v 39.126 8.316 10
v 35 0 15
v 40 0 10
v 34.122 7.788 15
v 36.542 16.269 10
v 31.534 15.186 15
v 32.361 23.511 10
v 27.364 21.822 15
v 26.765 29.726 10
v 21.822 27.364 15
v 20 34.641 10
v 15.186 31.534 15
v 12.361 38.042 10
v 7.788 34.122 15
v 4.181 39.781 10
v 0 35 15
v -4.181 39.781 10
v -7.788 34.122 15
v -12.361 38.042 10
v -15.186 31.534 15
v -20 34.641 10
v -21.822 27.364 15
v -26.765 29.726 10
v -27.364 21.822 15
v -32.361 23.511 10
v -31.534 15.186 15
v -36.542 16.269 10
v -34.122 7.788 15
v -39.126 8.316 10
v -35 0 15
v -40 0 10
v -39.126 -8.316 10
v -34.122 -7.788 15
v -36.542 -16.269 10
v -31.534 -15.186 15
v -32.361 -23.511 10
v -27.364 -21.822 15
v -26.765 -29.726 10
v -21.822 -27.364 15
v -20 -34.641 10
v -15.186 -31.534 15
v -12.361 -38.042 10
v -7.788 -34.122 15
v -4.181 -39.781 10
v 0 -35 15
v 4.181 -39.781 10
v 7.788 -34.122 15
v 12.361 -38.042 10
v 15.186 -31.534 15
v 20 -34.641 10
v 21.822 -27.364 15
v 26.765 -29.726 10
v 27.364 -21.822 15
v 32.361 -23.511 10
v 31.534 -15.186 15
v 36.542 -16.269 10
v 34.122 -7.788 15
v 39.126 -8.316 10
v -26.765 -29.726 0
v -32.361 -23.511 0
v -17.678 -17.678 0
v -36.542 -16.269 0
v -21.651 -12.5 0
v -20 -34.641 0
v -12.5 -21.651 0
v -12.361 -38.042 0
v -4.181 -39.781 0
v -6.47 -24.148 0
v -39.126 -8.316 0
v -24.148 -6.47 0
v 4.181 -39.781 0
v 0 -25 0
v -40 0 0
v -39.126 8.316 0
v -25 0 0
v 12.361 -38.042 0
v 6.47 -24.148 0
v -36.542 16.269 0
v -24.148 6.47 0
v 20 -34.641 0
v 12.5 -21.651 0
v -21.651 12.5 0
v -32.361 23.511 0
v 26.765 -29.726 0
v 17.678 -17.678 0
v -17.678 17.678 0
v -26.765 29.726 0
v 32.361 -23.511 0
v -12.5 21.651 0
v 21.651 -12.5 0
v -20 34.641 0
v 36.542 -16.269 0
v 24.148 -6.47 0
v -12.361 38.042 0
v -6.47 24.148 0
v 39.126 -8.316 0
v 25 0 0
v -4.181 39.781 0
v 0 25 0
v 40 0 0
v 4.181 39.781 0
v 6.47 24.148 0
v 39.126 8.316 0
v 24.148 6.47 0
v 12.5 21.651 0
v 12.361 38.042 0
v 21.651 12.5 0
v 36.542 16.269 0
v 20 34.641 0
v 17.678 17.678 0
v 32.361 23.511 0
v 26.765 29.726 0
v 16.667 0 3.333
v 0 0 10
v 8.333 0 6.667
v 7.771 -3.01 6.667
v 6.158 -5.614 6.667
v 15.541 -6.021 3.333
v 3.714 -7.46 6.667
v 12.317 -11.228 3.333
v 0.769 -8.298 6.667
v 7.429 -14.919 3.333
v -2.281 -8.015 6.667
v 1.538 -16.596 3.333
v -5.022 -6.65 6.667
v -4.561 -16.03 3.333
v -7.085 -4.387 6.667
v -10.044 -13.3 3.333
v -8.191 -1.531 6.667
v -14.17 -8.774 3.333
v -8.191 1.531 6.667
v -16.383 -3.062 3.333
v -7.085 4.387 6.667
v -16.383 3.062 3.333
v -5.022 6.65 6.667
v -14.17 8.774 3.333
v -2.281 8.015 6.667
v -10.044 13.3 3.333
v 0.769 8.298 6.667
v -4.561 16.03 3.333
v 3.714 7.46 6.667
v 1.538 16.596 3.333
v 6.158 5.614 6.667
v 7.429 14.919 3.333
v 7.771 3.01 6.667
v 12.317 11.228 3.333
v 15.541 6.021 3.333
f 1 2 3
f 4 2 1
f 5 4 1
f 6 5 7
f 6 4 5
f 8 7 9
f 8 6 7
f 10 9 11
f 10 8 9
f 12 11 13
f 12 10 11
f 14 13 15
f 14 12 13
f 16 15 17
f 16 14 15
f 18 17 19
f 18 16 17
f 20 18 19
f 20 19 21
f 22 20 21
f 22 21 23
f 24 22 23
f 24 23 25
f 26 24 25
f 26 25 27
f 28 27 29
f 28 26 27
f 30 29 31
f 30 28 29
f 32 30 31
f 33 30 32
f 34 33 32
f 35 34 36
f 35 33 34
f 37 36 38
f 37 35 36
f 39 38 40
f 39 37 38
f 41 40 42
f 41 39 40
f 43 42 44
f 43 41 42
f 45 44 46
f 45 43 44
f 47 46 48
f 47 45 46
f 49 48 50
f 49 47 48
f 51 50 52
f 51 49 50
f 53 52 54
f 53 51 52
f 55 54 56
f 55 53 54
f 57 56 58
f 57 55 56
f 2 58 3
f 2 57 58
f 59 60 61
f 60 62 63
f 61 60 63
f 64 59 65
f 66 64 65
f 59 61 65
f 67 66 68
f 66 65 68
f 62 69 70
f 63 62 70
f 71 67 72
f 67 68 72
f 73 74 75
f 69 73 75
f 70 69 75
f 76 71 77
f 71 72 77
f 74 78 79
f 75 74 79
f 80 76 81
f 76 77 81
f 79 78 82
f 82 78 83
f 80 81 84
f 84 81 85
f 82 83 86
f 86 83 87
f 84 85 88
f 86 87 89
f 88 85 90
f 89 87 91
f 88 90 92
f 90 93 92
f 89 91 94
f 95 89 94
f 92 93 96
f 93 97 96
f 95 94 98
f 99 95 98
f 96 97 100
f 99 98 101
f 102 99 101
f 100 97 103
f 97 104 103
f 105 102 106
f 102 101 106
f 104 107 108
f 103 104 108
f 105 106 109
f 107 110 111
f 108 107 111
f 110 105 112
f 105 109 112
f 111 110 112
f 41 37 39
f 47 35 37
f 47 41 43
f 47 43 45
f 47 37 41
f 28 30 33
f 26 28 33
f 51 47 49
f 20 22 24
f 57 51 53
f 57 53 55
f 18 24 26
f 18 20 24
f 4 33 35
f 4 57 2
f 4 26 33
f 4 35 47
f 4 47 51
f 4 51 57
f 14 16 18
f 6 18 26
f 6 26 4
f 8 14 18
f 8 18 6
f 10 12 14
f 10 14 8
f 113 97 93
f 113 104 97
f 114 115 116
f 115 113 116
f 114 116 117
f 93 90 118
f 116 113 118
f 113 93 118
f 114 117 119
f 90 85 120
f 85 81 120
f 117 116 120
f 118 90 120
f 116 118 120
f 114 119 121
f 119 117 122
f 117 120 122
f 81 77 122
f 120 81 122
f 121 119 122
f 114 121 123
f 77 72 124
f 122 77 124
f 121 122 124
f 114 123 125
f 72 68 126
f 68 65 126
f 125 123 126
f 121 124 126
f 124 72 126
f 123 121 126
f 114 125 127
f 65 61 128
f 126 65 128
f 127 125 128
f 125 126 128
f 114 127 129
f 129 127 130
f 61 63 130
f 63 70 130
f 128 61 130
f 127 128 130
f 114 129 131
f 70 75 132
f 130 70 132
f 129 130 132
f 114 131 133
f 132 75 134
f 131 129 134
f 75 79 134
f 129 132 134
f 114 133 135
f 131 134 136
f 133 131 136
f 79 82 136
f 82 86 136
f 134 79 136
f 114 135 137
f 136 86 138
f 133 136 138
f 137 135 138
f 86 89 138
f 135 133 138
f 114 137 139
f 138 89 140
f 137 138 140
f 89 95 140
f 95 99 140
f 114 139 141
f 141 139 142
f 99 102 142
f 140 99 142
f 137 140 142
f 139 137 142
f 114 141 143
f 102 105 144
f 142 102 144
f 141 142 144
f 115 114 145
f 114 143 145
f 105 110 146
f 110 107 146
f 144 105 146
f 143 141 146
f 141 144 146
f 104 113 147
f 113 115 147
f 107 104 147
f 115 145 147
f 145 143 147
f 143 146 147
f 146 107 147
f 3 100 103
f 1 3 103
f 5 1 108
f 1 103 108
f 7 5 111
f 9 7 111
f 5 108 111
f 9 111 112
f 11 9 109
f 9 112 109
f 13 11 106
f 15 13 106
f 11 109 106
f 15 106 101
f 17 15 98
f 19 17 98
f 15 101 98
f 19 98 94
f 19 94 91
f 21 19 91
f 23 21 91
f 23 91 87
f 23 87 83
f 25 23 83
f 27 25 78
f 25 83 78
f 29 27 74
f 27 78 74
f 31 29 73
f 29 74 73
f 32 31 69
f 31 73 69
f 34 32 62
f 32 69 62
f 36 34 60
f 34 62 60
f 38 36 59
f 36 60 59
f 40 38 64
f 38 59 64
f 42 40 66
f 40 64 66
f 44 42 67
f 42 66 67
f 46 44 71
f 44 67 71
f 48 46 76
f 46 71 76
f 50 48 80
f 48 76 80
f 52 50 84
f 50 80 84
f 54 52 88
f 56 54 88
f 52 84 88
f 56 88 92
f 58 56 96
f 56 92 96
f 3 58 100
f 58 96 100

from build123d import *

# Parameters (mm, degrees)
F0_R     = 40
F1_DEPTH = 15
F2_SIZE  = 5
F3_R     = 25
F4_DEPTH = 10
F5_SIZE2 = 9.99999
F5_SIZE  = 24.99999


# Not quite as in the source:
# - a fillet or chamfer is up to 0.001 mm smaller than in the source, because OpenCascade refuses the exact size


with BuildPart() as f1:
    # F0 (on Top) → F1 (new body)
    with BuildSketch(Plane.XY):
        Circle(F0_R)
    extrude(amount=F1_DEPTH)

    # F2
    f2_edges = [f1.edges().sort_by_distance(p)[0] for p in [
        (-40, 0, 15),
    ]]
    chamfer(f2_edges, length=F2_SIZE)

    # F3 (on face) → F4 (cut)
    with BuildSketch(Plane(origin=(0, 0, 0), x_dir=(1, 0, 0), z_dir=(0, 0, -1))):
        Circle(F3_R)
    extrude(amount=-F4_DEPTH, mode=Mode.SUBTRACT)

    # F5 (size 25 and 10 in the source; OpenCascade refuses exactly that, so slightly less here)
    f5_edges = [f1.edges().sort_by_distance(p)[0] for p in [
        (-25, 0, 10),
    ]]
    f5_side = f1.faces().sort_by_distance((0, 0, 10))[0]
    chamfer(f5_edges, length=F5_SIZE, length2=F5_SIZE2, reference=f5_side)


solid = f1.part
